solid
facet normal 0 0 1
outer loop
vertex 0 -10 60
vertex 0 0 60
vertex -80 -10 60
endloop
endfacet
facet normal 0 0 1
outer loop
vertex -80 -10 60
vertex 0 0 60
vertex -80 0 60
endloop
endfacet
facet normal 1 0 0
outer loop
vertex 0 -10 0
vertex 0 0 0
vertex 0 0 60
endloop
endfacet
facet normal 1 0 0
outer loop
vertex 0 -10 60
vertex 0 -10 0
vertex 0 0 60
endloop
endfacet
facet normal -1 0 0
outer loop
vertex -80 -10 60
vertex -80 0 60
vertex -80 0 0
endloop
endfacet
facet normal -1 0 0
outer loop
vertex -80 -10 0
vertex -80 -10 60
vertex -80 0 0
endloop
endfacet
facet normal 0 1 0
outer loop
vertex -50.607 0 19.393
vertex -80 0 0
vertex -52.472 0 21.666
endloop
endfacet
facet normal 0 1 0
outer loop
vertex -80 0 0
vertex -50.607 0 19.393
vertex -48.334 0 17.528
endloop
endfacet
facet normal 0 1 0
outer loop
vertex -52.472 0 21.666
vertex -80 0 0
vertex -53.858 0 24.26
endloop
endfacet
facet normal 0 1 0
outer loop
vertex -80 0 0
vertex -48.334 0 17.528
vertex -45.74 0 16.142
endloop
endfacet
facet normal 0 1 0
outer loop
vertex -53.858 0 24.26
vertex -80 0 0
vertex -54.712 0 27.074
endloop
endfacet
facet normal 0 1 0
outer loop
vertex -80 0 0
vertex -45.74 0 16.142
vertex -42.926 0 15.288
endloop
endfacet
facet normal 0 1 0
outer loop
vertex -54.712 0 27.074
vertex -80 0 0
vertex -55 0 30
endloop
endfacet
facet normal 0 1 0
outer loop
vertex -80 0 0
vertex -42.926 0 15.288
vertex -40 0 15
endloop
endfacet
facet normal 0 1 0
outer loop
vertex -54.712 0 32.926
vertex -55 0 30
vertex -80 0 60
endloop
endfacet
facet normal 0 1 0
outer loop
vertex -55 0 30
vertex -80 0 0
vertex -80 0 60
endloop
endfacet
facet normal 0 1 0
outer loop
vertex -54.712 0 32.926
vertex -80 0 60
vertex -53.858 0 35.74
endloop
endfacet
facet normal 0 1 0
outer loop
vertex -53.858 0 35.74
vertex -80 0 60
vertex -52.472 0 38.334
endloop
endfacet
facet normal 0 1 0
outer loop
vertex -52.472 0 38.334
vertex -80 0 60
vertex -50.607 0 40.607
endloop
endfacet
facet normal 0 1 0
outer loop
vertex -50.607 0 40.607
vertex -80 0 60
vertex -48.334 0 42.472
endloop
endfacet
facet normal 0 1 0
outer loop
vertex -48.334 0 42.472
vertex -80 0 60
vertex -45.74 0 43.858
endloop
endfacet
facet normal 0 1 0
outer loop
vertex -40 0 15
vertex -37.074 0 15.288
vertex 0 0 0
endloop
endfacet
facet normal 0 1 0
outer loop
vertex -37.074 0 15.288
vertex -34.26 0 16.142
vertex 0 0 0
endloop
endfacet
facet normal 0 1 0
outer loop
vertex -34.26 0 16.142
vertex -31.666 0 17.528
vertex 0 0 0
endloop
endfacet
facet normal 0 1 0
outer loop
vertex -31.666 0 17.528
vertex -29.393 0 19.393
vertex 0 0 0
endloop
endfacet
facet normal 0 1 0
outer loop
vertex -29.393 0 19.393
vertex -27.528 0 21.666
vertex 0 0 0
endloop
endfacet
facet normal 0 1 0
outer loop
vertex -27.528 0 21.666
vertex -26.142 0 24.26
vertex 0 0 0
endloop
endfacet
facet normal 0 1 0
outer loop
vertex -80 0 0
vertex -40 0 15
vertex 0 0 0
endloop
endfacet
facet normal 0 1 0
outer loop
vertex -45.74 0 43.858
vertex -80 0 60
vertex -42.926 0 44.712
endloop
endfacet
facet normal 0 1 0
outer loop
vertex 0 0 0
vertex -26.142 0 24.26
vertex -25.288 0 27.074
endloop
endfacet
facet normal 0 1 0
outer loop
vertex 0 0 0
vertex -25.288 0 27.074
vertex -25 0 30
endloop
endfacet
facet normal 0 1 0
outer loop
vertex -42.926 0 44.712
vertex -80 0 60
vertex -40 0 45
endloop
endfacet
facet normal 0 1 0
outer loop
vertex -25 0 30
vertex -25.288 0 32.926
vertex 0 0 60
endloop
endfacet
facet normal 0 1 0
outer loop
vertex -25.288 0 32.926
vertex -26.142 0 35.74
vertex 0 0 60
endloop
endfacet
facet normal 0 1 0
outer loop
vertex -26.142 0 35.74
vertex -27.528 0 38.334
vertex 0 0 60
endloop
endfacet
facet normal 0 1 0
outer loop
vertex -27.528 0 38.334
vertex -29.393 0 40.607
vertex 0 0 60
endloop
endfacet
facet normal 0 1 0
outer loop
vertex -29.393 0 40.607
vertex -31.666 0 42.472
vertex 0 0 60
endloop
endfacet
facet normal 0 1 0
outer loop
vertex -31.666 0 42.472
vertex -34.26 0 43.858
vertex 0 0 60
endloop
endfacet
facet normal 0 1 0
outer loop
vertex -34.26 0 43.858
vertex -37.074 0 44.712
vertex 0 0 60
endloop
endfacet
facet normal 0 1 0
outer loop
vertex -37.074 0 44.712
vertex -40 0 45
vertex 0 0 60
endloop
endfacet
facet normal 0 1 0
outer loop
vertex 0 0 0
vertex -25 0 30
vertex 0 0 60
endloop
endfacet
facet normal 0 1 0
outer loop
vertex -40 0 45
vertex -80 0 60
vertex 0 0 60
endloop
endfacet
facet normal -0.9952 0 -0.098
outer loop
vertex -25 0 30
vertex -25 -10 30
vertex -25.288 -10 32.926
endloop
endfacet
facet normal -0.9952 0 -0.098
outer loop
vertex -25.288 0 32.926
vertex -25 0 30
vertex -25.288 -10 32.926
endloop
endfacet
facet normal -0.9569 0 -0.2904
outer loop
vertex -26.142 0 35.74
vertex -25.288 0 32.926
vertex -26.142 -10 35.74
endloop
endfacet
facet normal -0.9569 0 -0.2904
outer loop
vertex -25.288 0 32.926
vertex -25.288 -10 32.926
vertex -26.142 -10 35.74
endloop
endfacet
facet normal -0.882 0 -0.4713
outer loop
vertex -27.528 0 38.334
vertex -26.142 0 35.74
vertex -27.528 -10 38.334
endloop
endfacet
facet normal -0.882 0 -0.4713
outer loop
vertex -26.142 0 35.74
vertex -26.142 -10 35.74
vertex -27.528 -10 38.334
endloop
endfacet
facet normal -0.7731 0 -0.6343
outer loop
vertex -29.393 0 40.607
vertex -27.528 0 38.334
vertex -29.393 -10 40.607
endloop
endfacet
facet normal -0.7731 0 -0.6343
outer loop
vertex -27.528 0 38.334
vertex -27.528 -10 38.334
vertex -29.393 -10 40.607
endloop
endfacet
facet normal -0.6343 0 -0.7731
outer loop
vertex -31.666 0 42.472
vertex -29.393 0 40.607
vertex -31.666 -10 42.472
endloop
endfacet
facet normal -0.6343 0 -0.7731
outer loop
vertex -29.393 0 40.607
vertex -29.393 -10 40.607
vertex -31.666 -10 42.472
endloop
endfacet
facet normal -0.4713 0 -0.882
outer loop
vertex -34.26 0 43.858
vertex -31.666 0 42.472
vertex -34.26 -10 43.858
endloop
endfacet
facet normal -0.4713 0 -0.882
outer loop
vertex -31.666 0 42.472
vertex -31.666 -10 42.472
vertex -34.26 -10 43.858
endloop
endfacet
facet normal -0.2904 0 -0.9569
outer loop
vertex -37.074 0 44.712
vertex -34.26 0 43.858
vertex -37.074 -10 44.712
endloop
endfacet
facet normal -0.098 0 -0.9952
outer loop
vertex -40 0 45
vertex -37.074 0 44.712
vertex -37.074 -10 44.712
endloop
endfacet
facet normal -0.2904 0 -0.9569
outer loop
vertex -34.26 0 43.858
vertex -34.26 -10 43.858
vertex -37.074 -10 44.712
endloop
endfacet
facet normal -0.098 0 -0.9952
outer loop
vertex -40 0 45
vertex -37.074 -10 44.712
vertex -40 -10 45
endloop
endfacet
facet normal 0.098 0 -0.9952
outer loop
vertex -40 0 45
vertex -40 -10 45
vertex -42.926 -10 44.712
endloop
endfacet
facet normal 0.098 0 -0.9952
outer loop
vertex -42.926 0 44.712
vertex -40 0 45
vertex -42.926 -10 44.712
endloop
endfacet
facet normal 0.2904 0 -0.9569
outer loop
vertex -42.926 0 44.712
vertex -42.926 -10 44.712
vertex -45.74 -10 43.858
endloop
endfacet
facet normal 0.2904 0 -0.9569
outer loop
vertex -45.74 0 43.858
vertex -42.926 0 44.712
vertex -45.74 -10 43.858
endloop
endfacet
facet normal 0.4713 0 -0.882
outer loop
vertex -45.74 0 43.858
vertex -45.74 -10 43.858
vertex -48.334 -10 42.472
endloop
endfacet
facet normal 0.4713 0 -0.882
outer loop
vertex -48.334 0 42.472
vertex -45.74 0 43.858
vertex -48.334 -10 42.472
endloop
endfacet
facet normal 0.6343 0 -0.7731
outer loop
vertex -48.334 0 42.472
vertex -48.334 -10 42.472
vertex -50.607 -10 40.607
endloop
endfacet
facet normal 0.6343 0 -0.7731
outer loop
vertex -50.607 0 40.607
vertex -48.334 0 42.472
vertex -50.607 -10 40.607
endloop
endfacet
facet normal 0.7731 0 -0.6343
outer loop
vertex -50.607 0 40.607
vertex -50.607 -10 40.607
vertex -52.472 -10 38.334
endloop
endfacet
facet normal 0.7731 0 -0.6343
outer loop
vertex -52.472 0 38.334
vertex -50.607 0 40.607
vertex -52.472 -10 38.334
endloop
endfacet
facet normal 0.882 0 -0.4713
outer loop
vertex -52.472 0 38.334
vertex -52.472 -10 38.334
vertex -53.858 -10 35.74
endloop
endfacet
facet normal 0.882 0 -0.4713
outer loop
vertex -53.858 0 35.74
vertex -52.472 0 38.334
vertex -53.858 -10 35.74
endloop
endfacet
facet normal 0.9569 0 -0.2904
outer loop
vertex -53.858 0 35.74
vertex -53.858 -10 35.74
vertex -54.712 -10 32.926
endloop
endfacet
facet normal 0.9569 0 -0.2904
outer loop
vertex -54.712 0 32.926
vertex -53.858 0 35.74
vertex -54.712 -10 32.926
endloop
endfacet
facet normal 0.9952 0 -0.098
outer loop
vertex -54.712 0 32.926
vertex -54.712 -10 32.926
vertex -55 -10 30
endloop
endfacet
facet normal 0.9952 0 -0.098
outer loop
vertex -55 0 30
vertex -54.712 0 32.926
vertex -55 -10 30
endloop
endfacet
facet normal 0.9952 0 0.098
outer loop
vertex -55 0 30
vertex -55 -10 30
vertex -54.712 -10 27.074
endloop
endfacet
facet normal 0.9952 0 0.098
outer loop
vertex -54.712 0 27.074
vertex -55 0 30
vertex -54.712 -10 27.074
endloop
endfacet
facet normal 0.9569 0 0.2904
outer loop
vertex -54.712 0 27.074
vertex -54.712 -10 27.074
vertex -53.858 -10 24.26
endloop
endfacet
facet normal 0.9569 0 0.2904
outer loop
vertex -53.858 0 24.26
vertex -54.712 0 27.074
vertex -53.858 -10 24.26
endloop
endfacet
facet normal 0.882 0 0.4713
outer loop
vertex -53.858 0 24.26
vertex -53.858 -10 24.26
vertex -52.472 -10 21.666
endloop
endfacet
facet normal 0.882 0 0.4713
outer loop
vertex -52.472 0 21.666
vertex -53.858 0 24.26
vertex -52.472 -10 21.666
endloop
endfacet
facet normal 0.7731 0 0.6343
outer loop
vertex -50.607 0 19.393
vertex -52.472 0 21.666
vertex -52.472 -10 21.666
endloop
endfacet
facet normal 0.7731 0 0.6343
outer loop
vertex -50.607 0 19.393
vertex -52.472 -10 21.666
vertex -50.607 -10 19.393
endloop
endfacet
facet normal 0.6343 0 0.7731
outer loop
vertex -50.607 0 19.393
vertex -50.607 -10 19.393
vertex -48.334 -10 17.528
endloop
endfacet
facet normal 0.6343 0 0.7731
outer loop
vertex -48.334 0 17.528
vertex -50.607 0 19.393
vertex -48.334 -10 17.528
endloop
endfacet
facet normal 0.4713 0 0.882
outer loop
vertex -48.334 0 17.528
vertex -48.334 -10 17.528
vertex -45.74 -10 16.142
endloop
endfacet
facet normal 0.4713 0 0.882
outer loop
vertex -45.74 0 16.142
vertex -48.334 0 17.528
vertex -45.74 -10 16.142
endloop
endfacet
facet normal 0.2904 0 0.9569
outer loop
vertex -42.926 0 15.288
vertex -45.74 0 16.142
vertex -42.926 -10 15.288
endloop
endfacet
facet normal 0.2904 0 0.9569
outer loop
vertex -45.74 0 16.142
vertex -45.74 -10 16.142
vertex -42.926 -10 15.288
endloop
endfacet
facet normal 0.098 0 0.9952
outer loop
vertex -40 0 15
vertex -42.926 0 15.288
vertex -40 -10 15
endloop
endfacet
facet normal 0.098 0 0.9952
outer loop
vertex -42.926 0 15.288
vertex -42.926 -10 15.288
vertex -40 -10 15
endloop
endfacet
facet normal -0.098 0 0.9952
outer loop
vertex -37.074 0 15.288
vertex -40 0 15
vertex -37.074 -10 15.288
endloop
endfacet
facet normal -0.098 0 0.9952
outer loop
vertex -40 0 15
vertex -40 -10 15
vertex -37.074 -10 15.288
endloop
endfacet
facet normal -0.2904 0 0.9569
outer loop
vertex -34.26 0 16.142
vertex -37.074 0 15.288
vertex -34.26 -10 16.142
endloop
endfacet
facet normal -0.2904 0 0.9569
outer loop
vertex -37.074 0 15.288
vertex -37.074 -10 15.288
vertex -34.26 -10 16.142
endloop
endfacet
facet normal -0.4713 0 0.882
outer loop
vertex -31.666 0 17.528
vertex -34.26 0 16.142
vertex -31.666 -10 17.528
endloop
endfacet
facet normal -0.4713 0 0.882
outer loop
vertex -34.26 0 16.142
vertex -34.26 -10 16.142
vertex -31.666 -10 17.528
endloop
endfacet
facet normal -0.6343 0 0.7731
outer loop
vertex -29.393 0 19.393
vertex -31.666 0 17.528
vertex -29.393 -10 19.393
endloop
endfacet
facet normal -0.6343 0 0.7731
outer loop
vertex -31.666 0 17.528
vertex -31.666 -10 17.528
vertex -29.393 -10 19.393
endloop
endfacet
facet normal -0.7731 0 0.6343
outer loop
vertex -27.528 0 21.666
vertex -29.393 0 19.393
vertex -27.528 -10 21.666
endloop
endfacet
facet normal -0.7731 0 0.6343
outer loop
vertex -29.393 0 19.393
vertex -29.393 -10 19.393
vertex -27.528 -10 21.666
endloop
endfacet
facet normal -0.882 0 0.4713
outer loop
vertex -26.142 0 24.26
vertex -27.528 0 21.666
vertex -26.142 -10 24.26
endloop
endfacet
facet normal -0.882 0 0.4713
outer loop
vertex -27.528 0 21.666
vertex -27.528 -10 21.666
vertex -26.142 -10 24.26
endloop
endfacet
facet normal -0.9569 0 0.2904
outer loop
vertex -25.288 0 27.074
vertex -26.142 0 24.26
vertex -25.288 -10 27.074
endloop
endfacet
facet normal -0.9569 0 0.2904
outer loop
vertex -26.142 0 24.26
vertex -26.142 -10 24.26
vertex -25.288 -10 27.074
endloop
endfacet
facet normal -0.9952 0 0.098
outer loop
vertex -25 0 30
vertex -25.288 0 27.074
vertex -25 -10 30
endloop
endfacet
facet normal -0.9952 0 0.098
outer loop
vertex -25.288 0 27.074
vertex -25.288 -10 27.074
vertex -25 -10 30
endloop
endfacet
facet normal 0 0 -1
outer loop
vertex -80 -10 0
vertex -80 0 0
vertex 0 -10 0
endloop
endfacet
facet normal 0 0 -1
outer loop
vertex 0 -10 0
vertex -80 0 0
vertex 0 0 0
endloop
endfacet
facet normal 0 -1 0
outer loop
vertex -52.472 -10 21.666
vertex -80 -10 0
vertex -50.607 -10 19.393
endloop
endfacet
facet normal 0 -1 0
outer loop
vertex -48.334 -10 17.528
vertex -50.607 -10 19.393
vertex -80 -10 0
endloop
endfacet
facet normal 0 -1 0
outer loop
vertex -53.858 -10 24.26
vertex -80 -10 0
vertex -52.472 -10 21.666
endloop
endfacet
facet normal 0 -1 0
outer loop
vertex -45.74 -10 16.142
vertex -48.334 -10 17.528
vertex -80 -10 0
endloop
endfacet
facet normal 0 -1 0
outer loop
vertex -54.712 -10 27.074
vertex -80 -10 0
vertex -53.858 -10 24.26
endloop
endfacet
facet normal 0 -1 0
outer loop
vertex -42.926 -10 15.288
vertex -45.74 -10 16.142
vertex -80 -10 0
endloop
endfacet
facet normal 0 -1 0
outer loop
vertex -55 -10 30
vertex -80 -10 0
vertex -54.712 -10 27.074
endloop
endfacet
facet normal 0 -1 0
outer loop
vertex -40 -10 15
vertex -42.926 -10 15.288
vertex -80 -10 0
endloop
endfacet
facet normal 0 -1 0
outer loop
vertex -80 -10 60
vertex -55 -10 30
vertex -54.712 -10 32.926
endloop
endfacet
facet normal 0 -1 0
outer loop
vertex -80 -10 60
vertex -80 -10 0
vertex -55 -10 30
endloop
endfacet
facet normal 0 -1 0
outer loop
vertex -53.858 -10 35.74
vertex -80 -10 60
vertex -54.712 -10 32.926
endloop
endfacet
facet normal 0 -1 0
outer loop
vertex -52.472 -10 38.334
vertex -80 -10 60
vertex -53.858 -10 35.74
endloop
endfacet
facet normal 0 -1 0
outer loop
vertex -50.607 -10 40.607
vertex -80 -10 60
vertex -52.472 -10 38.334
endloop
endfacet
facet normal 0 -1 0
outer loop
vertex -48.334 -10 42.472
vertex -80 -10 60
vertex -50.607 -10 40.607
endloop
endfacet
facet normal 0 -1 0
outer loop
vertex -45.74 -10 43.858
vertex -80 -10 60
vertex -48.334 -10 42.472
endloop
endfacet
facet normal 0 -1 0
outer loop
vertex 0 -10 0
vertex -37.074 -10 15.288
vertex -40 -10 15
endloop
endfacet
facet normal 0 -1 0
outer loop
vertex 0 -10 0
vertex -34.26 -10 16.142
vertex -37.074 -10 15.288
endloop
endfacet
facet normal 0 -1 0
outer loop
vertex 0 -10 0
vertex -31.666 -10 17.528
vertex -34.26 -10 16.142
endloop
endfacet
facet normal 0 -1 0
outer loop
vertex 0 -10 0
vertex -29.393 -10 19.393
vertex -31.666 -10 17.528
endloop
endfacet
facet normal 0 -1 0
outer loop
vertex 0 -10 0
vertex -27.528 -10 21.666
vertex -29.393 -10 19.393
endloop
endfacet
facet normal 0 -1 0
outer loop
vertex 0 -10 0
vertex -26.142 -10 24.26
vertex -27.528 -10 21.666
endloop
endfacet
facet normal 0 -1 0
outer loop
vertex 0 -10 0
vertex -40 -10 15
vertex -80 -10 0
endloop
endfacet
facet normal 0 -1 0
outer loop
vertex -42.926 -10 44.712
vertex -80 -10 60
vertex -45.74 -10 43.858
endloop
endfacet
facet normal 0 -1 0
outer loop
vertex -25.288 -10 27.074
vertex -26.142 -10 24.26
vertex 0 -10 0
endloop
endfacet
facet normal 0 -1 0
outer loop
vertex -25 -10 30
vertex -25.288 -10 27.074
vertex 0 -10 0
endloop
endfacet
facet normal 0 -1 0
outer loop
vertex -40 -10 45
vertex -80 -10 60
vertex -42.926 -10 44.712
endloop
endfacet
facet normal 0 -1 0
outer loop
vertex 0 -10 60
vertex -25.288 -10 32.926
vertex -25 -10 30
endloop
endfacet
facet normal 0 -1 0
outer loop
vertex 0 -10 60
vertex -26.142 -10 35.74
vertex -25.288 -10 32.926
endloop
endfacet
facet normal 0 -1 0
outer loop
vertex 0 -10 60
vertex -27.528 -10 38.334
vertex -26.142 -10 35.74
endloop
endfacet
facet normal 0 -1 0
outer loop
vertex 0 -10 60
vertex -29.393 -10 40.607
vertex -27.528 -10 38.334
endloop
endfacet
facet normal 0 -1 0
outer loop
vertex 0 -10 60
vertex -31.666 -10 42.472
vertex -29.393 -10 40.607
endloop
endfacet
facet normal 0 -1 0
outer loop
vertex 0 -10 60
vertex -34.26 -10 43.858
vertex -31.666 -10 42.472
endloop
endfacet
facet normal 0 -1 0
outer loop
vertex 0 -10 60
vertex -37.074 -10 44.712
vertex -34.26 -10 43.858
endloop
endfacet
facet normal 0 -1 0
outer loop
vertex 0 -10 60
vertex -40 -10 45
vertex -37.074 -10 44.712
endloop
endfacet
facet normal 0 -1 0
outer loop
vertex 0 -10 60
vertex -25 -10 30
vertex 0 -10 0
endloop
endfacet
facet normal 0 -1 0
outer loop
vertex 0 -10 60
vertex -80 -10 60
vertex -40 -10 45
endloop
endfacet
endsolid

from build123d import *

# Parameters (mm, degrees)
F0_W     = 40
F0_H     = 30
F1_DEPTH = 10
F2_R     = 15
F3_DEPTH = 10.001


with BuildPart() as f1:
    # F0 (on Front) → F1 (new body)
    with BuildSketch(Plane.XZ):
        with Locations((-20, 15)):
            Rectangle(F0_W, F0_H)
        with Locations((-60, 15)):
            Rectangle(F0_W, F0_H)
        with Locations((-20, 45)):
            Rectangle(F0_W, F0_H)
        with Locations((-60, 45)):
            Rectangle(F0_W, F0_H)
    extrude(amount=F1_DEPTH)

    # F2 (on face) → F3 (cut, through all)
    with BuildSketch(Plane.XZ.offset(10)):
        with Locations((-40, 30)):
            Circle(F2_R)
    extrude(amount=-F3_DEPTH, mode=Mode.SUBTRACT)


solid = f1.part
